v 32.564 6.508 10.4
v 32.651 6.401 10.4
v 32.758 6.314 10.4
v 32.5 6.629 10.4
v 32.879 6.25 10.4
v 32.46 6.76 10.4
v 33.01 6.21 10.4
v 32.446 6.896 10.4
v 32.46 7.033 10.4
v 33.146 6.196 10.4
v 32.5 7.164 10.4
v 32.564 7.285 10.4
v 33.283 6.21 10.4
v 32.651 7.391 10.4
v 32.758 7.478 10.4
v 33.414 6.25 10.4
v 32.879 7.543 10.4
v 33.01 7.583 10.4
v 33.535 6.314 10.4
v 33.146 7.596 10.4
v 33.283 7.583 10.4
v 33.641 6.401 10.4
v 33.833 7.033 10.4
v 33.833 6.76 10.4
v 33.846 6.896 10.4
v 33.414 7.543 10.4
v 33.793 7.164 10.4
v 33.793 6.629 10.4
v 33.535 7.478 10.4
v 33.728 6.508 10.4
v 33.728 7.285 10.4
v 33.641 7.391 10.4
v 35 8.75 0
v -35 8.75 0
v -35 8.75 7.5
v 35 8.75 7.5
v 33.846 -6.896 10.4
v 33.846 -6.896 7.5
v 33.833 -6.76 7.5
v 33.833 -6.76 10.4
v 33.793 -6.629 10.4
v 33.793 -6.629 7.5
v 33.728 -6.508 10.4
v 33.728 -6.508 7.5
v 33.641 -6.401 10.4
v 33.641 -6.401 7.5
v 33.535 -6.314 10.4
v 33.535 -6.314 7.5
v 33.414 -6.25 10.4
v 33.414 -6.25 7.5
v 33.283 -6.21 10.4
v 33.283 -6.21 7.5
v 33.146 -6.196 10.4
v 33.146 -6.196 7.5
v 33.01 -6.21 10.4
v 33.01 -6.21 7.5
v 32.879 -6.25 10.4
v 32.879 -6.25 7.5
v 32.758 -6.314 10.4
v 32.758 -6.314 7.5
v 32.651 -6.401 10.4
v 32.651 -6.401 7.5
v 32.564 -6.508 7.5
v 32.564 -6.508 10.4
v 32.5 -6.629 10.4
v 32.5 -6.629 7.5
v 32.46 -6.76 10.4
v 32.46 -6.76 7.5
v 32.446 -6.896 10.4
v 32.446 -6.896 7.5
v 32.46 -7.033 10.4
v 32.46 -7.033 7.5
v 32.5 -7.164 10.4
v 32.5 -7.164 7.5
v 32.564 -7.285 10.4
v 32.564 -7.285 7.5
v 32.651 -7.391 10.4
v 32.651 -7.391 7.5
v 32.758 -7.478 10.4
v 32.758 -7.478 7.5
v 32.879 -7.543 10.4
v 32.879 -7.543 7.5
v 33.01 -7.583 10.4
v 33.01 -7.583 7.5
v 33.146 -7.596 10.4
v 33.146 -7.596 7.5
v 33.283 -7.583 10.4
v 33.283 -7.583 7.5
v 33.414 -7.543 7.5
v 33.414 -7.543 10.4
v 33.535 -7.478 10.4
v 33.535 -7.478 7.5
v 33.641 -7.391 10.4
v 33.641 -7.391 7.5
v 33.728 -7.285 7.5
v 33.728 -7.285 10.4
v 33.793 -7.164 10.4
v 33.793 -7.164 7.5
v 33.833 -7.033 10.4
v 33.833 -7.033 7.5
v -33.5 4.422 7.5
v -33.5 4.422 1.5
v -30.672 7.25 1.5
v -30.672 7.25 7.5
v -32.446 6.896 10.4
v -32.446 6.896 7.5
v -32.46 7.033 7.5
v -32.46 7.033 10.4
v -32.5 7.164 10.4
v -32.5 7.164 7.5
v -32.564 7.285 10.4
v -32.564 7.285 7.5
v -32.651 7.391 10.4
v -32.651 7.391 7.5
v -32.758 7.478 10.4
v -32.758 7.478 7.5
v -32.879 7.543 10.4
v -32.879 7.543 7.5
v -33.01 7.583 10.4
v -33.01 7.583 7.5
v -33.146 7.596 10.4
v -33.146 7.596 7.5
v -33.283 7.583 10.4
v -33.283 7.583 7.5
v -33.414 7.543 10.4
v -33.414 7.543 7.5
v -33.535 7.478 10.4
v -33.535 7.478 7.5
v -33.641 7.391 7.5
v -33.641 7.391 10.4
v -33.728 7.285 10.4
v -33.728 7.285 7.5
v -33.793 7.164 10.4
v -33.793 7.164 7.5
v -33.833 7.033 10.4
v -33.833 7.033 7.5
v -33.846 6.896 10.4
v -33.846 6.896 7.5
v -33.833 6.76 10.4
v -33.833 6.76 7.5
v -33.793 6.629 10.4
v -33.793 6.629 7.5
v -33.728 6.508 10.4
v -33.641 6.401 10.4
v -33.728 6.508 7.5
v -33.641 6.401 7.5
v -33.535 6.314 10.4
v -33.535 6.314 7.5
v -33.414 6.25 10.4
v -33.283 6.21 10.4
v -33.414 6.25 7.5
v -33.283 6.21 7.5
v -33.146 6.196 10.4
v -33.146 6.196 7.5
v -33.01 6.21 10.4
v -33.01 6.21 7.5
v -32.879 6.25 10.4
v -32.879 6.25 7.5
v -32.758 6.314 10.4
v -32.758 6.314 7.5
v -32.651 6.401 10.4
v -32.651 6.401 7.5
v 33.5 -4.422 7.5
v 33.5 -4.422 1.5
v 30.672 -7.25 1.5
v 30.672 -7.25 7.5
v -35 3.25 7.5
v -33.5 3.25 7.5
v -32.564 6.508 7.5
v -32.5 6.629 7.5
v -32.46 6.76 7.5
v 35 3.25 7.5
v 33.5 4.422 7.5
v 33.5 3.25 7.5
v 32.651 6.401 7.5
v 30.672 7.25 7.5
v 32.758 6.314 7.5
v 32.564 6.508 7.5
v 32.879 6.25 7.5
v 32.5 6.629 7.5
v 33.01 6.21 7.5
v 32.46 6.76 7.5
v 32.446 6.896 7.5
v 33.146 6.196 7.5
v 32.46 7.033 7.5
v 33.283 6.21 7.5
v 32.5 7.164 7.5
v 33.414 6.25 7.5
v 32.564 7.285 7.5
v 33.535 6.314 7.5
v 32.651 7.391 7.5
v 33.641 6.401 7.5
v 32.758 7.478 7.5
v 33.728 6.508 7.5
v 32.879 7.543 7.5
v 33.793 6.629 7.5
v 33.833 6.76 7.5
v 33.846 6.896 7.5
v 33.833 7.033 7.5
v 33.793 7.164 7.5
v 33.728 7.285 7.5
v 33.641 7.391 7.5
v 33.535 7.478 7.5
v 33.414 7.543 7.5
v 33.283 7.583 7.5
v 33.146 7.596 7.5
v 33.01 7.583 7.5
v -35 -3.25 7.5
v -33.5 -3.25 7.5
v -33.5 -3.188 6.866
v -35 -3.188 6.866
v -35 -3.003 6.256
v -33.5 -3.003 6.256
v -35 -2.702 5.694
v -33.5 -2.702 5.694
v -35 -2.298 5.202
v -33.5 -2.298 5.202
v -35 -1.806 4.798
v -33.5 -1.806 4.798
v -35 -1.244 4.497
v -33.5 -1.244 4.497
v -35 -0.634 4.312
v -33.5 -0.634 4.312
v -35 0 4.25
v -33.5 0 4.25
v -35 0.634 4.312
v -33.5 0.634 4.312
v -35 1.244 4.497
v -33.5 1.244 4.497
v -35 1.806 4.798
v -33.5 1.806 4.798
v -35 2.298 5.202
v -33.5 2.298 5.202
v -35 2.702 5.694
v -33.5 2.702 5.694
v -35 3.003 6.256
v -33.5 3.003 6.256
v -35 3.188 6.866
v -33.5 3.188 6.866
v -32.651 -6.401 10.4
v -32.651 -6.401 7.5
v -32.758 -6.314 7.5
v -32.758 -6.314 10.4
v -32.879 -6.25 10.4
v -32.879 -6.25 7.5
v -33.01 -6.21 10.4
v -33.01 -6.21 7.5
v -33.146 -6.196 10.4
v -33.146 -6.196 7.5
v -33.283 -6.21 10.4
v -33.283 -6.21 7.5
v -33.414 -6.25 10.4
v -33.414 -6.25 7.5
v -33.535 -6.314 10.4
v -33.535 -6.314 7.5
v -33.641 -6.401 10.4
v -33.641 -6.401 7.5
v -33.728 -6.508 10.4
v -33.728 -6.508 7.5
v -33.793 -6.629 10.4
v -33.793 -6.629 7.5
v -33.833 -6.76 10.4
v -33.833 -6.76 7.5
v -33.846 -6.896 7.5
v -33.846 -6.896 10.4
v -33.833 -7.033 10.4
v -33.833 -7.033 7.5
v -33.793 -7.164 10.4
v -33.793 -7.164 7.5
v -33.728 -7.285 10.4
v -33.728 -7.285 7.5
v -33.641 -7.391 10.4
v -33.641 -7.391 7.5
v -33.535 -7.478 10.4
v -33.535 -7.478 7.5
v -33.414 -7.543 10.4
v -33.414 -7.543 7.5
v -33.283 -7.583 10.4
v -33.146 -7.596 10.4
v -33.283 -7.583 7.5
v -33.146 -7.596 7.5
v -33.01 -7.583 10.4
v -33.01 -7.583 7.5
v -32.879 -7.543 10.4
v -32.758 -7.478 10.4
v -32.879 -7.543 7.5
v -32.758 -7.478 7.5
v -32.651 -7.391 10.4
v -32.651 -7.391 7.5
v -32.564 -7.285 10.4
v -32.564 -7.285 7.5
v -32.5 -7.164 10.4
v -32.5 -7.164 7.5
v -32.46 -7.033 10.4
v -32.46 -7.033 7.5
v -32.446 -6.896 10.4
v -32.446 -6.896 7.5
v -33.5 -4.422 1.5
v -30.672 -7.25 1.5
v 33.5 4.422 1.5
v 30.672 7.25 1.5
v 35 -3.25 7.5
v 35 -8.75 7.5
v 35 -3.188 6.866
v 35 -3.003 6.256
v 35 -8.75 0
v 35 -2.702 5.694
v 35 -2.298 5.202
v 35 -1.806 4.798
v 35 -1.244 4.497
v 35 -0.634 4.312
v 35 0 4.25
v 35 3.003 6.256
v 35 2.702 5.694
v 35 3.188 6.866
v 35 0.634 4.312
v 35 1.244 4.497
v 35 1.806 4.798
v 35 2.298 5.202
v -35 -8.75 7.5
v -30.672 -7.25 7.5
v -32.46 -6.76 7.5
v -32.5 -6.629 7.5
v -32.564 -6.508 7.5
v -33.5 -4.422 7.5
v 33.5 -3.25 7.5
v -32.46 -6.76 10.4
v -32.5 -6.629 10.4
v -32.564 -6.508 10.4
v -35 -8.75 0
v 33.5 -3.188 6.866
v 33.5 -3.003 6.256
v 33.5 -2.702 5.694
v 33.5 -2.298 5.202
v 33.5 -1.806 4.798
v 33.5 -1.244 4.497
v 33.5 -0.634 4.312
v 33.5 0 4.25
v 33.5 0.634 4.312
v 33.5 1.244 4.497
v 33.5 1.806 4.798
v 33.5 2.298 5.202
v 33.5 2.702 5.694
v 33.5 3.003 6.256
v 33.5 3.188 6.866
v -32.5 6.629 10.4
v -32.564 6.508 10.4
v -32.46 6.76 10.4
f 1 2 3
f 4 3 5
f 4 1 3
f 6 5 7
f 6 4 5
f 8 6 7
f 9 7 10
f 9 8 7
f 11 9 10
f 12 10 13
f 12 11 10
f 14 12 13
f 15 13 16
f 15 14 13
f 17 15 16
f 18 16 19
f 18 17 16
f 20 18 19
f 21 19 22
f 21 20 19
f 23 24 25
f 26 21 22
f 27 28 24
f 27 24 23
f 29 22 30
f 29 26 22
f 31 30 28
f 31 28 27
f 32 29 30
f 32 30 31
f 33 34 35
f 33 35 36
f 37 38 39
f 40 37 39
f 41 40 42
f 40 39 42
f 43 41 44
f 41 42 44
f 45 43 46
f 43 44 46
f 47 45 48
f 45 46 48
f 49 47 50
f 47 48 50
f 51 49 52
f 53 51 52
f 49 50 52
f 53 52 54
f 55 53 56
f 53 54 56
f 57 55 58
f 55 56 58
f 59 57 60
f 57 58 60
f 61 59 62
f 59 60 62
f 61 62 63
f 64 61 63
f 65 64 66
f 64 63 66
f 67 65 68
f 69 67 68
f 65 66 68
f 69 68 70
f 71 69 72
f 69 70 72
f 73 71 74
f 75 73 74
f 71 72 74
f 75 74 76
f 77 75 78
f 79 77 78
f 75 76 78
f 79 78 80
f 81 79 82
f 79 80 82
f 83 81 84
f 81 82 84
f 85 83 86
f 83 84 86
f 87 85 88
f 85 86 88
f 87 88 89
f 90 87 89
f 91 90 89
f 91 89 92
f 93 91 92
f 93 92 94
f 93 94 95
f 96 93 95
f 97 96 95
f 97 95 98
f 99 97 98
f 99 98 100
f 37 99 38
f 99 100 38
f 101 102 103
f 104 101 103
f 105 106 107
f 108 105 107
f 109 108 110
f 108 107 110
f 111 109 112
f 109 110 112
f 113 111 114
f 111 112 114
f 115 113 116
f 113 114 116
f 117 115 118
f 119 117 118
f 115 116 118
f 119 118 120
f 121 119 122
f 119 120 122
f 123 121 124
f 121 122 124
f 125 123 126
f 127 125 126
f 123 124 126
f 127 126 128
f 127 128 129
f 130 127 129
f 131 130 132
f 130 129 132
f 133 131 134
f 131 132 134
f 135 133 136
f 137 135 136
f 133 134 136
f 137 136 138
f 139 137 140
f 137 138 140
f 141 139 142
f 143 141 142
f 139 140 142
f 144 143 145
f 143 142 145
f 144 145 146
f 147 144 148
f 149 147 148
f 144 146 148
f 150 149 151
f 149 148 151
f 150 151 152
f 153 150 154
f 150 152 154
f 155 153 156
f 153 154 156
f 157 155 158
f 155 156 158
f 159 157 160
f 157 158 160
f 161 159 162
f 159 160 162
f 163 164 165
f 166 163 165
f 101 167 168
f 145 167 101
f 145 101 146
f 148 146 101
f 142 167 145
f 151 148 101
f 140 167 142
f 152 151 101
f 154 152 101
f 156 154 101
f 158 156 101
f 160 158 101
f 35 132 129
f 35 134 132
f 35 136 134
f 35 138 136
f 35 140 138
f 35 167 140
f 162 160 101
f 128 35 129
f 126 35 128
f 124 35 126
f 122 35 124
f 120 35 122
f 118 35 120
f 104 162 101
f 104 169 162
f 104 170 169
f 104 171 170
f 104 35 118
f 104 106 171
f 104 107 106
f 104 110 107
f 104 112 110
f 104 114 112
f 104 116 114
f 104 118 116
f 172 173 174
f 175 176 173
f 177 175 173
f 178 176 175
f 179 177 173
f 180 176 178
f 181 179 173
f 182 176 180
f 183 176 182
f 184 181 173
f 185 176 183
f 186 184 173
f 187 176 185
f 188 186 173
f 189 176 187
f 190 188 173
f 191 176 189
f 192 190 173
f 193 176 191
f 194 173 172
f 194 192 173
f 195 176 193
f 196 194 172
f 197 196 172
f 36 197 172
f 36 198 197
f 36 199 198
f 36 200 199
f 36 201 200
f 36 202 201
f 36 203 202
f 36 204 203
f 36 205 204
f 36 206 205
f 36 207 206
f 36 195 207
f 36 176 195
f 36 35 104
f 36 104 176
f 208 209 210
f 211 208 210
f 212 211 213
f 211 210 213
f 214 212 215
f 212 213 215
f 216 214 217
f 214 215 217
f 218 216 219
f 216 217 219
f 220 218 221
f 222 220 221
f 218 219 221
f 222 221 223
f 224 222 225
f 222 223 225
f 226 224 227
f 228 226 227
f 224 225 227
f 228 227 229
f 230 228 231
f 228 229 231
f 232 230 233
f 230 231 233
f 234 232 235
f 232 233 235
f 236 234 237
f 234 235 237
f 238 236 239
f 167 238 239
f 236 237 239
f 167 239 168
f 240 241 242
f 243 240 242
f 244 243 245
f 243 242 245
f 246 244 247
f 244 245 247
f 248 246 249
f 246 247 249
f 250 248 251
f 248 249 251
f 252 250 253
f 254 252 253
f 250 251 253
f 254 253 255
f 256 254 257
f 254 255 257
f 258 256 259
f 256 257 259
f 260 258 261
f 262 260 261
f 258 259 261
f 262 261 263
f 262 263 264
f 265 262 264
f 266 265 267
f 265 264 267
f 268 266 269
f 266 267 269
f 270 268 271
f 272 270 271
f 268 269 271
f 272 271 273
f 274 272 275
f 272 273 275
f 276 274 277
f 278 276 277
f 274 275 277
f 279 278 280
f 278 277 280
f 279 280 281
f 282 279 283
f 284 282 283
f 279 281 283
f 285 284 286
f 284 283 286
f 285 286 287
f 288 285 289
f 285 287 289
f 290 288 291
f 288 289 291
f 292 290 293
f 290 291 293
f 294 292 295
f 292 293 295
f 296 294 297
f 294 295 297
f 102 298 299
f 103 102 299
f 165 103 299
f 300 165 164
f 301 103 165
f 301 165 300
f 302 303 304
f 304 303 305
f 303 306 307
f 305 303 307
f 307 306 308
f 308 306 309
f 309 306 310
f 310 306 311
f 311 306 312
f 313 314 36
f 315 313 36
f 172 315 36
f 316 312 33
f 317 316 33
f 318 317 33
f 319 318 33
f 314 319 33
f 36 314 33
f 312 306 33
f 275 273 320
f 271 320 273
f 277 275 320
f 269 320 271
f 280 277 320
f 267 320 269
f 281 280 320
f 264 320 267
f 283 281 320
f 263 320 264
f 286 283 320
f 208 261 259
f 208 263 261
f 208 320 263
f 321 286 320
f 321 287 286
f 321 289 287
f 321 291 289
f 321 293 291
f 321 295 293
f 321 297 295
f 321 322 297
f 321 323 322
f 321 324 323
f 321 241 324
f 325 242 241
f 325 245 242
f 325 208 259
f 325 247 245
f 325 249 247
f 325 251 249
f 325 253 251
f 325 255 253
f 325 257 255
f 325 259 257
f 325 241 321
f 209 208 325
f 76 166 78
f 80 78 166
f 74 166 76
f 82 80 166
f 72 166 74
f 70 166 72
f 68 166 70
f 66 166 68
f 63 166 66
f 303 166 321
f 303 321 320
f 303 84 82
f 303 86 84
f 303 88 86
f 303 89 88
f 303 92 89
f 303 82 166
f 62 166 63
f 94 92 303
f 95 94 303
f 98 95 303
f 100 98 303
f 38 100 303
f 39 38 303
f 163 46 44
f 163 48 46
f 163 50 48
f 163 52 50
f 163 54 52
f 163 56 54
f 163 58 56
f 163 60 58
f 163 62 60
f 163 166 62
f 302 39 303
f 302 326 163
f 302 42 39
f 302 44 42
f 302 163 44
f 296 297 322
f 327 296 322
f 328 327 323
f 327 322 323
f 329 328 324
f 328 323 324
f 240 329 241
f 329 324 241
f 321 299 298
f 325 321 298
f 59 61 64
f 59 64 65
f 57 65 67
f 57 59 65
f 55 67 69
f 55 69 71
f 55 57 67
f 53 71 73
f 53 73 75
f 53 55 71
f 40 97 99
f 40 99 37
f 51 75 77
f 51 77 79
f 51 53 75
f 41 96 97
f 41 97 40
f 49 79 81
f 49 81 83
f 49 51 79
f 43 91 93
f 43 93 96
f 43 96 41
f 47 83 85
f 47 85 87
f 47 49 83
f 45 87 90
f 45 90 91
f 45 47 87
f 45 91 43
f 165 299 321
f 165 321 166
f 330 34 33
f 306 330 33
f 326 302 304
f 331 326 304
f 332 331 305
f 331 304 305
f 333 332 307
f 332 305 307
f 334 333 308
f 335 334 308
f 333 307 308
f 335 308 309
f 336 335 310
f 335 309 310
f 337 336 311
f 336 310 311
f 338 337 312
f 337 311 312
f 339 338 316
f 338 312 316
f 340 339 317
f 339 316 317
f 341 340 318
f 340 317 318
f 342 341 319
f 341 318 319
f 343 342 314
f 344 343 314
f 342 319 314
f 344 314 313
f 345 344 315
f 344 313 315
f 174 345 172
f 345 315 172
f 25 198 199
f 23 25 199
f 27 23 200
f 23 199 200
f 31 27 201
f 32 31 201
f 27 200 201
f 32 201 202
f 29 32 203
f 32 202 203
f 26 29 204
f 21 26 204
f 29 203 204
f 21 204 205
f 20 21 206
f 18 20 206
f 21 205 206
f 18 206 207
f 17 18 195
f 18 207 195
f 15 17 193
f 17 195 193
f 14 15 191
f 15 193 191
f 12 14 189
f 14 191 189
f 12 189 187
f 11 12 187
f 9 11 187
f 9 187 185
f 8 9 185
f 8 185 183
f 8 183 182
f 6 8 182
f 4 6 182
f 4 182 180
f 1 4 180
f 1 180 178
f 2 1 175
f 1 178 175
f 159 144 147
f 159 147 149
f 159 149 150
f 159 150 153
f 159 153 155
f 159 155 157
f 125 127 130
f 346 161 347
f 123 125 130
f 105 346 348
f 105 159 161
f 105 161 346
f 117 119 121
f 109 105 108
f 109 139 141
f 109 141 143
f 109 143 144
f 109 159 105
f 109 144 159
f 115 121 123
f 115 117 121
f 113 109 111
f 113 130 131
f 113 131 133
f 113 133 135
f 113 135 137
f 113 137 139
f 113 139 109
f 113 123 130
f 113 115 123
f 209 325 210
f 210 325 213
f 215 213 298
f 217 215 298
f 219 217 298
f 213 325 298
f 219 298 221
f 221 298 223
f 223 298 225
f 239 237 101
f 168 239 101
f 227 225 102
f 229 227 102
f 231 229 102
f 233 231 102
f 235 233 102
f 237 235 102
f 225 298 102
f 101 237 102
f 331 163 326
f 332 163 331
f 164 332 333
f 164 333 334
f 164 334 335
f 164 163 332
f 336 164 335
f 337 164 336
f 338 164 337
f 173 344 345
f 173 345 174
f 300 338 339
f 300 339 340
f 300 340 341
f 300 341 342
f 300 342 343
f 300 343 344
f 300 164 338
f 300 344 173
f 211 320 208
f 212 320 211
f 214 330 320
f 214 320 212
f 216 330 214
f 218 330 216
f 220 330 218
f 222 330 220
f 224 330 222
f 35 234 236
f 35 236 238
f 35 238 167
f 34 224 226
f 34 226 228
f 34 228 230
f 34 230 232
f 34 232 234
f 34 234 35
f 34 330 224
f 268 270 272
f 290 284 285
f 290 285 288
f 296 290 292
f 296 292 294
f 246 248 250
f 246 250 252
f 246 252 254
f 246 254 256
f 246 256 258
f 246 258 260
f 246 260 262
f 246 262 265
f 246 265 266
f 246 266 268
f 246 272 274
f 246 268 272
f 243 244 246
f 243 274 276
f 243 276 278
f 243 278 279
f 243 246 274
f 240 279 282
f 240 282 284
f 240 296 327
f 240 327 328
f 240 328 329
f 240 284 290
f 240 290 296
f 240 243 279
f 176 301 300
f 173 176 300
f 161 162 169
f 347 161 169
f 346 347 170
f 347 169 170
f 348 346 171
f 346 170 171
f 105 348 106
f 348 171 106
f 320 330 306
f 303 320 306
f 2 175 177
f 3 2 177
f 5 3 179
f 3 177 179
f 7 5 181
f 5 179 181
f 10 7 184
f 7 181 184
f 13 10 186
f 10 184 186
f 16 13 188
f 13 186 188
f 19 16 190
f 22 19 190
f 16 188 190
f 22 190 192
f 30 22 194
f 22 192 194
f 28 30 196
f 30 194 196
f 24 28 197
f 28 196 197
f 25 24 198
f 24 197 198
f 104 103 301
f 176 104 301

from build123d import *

# Parameters (mm, degrees)
F0_W     = 70
F0_H     = 17.5
F1_DEPTH = 7.5
F2_T     = -1.5
F4_DEPTH = 6
F6_DEPTH = 2.9
F7_R     = 3.25
F8_DEPTH = 70.001


with BuildPart() as f1:
    # F0 (on Top) → F1 (new body)
    with BuildSketch(Plane.XY):
        Rectangle(F0_W, F0_H)
    extrude(amount=F1_DEPTH)

    # F2
    f2_openings = [f1.faces().sort_by_distance(p)[0] for p in [
        (0, 0, 7.5),
    ]]
    offset(amount=F2_T, openings=f2_openings)

    # F3 (on face) → F4 (join, through all)
    with BuildSketch(Plane.XY.offset(1.5)):
        Polygon((-33.5, 7.25), (-33.5, 4.421573), (-30.671573, 7.25), align=None)
        Polygon((30.671573, 7.25), (33.5, 4.421573), (33.5, 7.25), align=None)
        Polygon((33.5, -7.25), (33.5, -4.421573), (30.671573, -7.25), align=None)
        Polygon((-33.5, -4.421573), (-33.5, -7.25), (-30.671573, -7.25), align=None)
    extrude(amount=F4_DEPTH)

    # F5 (on face) → F6 (join)
    with BuildSketch(Plane.XY.offset(7.5)):
        with BuildLine():
            ThreePointArc((-32.651472, 6.401472), (-32.499731, 6.628568), (-32.446447, 6.896447))
            ThreePointArc((-32.446447, 6.896447), (-33.793162, 7.164325), (-32.651472, 6.401472))
        make_face()
        with BuildLine():
            ThreePointArc((-32.651472, -6.401472), (-33.793162, -7.164325), (-32.446447, -6.896447))
            ThreePointArc((-32.446447, -6.896447), (-32.499731, -6.628568), (-32.651472, -6.401472))
        make_face()
        with BuildLine():
            ThreePointArc((32.651472, 6.401472), (33.414325, 6.249731), (33.846447, 6.896447))
            ThreePointArc((33.846447, 6.896447), (32.878568, 7.543162), (32.651472, 6.401472))
        make_face()
        with BuildLine():
            ThreePointArc((32.651472, -6.401472), (32.878568, -7.543162), (33.846447, -6.896447))
            ThreePointArc((33.846447, -6.896447), (33.414325, -6.249731), (32.651472, -6.401472))
        make_face()
    extrude(amount=F6_DEPTH)

    # F7 (on face) → F8 (cut, through all)
    with BuildSketch(Plane.YZ.offset(35)):
        with Locations((0, 7.5)):
            Circle(F7_R)
    extrude(amount=-F8_DEPTH, mode=Mode.SUBTRACT)


solid = f1.part
